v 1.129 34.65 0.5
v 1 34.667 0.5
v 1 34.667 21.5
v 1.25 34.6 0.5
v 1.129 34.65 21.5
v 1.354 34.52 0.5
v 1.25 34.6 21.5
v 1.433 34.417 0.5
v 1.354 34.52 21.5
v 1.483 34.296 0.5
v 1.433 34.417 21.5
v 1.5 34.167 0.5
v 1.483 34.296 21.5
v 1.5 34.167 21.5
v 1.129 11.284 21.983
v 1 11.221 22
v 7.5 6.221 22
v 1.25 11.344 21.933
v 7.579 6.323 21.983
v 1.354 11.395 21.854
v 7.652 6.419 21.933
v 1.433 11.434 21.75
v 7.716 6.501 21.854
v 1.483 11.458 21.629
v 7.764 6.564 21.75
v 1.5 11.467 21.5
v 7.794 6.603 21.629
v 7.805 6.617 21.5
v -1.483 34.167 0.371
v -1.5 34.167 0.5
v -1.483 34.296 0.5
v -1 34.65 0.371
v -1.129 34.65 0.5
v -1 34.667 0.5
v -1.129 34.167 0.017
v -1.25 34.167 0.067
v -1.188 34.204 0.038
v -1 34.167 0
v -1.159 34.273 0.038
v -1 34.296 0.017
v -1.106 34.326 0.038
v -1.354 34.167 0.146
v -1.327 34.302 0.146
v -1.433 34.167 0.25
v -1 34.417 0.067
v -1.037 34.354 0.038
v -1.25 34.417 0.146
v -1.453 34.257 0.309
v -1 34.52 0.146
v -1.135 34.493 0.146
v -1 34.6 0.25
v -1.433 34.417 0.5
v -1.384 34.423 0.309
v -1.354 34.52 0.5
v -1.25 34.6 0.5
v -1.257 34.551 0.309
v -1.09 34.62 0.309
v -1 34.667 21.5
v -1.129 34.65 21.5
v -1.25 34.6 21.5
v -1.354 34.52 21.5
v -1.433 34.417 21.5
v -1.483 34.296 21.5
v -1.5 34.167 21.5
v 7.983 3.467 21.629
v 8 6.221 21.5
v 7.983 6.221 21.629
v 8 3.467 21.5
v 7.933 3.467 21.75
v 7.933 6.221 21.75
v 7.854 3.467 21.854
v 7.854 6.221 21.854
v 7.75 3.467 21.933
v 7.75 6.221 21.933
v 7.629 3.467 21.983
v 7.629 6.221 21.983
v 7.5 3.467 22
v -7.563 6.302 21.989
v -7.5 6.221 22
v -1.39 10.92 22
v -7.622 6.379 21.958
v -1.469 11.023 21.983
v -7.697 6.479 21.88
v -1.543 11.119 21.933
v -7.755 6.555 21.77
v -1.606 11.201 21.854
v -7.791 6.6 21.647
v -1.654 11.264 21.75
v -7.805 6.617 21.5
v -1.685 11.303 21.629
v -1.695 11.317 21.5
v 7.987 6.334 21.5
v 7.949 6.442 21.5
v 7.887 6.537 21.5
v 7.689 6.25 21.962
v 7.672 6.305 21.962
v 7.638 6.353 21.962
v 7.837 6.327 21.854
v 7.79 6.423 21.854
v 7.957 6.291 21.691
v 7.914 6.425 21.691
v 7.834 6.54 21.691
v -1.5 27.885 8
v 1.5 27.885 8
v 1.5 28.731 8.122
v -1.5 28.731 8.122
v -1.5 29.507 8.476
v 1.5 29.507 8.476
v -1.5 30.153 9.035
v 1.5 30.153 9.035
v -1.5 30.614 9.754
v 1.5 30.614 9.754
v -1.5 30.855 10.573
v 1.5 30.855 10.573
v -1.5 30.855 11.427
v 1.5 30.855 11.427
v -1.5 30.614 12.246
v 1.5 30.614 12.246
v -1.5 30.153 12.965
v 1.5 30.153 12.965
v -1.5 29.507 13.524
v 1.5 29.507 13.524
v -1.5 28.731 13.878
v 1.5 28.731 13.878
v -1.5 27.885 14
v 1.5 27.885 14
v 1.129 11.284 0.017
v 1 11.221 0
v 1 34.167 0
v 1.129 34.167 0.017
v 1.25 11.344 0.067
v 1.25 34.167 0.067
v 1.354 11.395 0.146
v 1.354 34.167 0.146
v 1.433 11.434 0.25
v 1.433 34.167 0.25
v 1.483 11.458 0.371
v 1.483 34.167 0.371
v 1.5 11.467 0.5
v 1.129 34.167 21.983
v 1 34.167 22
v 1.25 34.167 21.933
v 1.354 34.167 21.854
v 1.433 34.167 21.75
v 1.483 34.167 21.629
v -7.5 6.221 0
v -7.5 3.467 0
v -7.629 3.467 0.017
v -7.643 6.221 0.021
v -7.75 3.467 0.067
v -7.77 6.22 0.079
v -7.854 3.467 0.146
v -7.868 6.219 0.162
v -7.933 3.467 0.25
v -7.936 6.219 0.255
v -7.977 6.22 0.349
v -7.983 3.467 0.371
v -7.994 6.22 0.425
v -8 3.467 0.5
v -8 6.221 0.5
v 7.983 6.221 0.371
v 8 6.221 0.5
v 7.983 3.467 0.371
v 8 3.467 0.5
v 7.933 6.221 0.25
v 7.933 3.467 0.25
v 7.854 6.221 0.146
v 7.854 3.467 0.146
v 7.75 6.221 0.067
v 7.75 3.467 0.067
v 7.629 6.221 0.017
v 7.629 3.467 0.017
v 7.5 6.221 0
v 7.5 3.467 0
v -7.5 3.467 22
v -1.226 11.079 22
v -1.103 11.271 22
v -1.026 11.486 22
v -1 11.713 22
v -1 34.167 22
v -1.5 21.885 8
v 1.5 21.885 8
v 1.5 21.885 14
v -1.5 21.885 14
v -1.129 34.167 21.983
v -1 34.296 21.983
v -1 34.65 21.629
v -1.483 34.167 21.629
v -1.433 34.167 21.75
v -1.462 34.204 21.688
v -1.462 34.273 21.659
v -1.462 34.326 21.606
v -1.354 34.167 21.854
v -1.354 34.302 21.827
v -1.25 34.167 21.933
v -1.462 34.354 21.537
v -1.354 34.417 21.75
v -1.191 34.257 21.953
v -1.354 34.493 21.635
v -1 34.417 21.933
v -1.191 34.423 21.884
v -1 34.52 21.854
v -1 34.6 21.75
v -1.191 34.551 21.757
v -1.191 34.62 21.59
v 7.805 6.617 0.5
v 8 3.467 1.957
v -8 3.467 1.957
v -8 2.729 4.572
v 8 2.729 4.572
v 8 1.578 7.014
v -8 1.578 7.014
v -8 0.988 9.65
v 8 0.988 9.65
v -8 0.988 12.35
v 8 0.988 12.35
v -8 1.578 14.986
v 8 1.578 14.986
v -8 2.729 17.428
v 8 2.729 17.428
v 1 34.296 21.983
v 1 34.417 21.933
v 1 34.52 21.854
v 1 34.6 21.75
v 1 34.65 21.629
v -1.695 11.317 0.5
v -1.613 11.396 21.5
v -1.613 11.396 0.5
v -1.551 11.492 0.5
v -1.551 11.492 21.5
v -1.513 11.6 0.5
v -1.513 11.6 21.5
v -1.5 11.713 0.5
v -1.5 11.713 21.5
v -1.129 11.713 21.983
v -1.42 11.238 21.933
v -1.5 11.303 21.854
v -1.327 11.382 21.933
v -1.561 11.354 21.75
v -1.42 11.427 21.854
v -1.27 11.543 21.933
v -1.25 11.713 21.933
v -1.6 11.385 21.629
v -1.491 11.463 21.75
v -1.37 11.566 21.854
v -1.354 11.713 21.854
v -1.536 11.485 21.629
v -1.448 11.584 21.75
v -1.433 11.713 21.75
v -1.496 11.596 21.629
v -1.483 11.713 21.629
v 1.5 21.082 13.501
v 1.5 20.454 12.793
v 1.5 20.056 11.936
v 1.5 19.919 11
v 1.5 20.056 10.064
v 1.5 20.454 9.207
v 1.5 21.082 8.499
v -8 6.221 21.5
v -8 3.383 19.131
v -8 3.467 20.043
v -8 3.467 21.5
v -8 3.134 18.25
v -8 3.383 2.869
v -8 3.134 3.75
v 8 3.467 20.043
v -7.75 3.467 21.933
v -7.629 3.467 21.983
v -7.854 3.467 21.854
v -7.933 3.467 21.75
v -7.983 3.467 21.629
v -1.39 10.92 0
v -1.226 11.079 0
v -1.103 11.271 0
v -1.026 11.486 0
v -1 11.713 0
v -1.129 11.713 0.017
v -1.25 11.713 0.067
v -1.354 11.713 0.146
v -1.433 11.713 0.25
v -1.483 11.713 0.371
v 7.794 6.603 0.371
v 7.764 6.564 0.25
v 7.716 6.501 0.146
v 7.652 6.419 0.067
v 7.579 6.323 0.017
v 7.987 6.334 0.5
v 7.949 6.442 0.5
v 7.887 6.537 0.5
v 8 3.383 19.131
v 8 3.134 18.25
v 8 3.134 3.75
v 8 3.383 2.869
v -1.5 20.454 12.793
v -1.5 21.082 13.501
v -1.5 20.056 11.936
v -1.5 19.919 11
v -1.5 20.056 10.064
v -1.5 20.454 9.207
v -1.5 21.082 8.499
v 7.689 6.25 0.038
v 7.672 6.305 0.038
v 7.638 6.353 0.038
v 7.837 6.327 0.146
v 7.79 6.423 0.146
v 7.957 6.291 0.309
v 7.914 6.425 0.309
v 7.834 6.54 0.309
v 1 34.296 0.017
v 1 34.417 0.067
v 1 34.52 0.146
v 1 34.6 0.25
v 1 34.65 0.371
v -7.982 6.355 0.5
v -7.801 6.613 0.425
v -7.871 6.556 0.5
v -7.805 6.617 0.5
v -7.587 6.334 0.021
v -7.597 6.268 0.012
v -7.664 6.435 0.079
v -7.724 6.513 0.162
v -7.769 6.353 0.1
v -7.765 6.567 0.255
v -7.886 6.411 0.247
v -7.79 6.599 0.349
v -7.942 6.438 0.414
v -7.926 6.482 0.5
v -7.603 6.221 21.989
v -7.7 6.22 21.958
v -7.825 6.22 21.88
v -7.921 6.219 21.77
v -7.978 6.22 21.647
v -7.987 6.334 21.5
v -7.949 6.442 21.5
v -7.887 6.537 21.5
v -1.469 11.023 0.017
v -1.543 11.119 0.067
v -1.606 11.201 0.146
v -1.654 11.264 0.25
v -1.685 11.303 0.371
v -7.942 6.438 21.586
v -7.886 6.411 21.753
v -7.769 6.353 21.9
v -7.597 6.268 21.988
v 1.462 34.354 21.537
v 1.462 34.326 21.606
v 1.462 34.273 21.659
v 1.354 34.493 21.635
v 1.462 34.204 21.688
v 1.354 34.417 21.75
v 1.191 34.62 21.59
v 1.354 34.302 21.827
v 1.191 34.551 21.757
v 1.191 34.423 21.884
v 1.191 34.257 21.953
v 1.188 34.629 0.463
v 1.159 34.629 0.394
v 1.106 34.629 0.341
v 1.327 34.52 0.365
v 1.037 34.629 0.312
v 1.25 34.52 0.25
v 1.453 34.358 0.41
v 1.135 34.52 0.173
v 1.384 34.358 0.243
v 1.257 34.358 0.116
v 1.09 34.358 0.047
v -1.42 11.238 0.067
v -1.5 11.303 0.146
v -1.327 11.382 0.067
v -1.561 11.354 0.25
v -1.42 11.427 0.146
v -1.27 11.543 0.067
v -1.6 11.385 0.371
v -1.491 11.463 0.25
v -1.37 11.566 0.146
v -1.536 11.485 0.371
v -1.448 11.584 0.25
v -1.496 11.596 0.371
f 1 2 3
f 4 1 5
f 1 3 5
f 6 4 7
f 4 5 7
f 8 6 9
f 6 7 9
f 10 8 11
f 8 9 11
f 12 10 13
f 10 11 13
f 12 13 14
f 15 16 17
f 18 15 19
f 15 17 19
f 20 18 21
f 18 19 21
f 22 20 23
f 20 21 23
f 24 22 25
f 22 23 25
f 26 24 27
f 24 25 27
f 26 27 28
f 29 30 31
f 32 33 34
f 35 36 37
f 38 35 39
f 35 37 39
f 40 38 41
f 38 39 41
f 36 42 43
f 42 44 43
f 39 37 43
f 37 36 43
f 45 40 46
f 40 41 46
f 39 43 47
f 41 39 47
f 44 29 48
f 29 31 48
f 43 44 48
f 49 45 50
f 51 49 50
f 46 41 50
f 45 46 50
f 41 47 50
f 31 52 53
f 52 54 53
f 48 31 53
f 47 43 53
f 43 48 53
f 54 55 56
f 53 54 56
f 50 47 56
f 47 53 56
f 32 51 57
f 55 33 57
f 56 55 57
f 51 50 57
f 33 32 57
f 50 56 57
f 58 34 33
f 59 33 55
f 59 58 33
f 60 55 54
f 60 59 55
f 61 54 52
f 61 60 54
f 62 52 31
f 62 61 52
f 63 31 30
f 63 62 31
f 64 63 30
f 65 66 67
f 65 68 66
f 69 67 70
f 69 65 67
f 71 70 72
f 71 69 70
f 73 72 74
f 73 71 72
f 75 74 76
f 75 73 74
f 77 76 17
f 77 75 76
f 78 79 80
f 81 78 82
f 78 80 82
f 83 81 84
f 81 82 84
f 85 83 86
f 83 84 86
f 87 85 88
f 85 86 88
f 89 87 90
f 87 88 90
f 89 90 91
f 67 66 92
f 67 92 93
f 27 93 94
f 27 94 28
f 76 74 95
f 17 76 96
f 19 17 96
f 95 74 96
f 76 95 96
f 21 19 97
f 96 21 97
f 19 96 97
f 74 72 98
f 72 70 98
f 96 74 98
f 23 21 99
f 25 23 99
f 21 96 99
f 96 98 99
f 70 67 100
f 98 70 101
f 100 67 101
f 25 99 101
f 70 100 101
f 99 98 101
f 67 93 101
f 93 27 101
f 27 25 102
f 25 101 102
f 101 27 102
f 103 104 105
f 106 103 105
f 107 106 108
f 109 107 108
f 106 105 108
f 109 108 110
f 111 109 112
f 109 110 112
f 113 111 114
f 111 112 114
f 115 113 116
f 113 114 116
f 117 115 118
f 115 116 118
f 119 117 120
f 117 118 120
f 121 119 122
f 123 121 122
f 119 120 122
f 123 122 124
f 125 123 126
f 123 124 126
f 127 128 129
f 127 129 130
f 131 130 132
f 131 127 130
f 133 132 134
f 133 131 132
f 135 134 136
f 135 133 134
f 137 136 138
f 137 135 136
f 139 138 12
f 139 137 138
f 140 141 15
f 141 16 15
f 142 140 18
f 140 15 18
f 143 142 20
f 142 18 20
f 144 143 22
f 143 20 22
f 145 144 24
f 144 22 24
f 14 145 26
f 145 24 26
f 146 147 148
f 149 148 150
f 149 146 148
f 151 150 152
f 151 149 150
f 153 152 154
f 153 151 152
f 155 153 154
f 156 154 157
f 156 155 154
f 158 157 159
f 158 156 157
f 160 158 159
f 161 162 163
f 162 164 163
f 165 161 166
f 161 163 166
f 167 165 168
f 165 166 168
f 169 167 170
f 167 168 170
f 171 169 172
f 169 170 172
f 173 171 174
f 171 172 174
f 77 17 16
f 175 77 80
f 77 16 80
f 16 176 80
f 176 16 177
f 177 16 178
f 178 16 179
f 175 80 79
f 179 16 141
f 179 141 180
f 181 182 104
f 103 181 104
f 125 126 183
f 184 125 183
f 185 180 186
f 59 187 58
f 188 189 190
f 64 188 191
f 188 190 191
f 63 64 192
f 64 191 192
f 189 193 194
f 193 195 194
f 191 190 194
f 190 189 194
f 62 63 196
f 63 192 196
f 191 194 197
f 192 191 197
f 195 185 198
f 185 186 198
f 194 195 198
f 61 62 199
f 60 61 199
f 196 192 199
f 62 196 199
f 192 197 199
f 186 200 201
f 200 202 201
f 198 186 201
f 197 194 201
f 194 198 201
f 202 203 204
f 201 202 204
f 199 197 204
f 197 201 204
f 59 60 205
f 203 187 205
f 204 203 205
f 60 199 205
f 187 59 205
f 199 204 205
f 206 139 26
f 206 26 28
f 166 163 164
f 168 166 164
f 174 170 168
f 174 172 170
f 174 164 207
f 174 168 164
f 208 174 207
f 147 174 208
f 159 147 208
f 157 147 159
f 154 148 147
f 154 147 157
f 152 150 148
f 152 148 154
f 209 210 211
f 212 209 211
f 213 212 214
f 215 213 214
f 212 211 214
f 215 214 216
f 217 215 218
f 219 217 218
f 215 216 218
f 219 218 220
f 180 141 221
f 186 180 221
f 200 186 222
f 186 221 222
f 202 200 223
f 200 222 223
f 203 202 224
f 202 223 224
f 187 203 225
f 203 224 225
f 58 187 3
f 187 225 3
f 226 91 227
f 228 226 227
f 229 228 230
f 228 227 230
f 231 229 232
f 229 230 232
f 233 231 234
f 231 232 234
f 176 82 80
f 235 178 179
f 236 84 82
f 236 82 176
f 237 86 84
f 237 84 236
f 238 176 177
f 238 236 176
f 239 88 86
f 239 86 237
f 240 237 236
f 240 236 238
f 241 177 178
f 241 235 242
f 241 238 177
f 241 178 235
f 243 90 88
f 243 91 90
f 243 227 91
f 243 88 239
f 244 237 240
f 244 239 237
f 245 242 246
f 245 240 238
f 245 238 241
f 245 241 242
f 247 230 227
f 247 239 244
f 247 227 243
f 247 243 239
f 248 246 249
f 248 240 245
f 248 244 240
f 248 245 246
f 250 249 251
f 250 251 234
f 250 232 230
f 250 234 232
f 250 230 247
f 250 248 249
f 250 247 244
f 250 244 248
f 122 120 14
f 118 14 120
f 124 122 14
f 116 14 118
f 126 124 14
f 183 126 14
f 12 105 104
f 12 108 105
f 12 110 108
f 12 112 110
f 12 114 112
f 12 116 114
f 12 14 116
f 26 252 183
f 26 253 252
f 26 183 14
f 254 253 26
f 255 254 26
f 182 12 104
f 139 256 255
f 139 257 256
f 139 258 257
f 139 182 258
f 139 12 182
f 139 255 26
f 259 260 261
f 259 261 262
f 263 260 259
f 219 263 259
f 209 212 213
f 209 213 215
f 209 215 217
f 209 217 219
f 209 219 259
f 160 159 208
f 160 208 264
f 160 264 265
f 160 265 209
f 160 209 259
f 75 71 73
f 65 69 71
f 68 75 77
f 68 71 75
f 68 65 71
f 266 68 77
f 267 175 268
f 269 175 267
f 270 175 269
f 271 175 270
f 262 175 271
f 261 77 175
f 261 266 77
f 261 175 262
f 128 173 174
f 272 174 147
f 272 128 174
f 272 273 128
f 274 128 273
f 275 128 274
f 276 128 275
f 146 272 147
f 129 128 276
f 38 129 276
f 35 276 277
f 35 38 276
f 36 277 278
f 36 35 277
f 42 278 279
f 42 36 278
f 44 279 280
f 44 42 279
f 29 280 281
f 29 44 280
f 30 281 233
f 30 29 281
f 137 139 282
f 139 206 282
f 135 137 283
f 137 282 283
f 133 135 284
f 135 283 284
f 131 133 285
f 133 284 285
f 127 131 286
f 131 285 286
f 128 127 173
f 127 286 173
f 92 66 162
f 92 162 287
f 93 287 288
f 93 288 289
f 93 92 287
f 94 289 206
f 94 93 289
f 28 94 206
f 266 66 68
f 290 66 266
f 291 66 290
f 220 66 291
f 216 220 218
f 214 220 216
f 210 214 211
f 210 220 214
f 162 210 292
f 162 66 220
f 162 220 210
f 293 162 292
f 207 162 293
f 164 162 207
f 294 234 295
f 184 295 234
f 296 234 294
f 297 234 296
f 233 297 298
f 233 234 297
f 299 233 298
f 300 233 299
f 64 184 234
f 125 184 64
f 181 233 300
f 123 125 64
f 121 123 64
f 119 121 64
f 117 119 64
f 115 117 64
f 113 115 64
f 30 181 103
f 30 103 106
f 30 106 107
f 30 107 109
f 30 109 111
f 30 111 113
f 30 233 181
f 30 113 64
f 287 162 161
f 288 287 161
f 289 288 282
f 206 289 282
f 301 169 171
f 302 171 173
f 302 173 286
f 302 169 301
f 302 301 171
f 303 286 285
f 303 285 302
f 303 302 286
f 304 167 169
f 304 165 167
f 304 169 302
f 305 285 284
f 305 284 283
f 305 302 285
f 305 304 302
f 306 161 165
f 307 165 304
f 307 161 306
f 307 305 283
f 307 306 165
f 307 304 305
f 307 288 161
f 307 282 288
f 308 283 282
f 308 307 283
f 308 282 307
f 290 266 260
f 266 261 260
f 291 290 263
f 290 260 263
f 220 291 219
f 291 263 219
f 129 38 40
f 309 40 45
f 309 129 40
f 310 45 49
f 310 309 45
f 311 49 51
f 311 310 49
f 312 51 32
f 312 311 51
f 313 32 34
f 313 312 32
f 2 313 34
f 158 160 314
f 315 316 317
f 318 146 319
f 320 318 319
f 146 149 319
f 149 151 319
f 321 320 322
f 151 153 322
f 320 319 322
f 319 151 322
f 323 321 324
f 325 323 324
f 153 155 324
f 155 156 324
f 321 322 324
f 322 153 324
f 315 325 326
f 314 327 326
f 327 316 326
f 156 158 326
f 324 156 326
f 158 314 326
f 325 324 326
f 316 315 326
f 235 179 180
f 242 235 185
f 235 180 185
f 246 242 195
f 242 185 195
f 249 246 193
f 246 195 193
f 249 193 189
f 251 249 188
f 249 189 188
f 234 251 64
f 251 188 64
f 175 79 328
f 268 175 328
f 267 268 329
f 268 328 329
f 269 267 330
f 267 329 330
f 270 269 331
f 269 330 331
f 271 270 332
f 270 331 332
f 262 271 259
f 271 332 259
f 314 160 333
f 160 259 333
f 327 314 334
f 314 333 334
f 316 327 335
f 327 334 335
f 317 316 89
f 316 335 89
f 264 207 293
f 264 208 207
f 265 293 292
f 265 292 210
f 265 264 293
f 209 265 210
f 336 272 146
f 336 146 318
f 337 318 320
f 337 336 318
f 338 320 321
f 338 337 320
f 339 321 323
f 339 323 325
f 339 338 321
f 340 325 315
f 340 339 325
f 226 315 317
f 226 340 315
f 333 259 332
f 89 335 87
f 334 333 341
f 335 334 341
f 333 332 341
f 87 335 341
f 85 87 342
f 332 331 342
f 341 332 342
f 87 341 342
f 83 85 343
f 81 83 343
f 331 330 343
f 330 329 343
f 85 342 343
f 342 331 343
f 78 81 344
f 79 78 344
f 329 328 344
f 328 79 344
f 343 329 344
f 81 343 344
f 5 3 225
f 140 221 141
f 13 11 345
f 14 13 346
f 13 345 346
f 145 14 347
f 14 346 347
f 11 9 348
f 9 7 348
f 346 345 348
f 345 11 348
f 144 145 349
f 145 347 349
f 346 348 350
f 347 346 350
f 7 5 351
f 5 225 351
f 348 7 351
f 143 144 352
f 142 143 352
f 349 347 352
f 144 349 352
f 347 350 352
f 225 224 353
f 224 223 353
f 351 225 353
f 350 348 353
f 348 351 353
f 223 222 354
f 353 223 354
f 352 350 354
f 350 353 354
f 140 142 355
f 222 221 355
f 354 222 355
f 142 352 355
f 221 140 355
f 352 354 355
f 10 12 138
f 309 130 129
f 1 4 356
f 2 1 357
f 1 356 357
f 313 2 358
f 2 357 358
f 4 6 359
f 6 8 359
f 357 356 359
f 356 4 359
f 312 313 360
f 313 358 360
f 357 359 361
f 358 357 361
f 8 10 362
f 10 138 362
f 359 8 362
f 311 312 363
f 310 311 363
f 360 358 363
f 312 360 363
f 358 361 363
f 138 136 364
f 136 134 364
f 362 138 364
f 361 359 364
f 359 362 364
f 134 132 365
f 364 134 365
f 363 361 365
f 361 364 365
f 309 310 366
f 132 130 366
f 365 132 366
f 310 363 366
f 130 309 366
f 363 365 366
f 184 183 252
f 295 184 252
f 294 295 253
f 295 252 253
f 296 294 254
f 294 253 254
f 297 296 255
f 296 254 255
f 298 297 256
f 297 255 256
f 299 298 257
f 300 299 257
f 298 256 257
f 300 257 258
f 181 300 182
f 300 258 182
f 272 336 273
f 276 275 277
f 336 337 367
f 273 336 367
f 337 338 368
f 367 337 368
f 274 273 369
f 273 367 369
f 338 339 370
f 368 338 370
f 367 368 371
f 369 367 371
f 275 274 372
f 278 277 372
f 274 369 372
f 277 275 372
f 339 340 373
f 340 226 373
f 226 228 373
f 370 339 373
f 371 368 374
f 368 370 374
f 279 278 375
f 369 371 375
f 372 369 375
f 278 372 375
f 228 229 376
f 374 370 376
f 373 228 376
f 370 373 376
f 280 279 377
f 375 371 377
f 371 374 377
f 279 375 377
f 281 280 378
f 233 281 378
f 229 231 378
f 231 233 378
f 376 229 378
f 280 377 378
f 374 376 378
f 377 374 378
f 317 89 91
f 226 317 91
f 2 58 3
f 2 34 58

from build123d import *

# Parameters (mm, degrees)
RESSALTO_EXTRUS_O1_DEPTH = 22
RESSALTO_EXTRUS_O2_DEPTH = 16
FILETE1_R                = 5
FILETE2_R                = 0.5
FILETE3_R                = 0.5
CORTE_EXTRUS_O1_DEPTH    = 43.143081298


with BuildPart() as part:
    # Esboço2 → Ressalto-extrusão1 (new body)
    with BuildSketch(Plane.XY):
        Polygon((-1.5, 34.66683278), (1.5, 34.66683278), (1.5, 11.46683278), (8, 6.46683278), (8, 3.46683278), (-8, 3.46683278), (-8, 6.46683278), (-1.5, 11.46683278), align=None)
    extrude(amount=RESSALTO_EXTRUS_O1_DEPTH)

    # Esboço3 → Ressalto-extrusão2 (add)
    with BuildSketch(Plane(origin=(8, 0, 0), x_dir=(0, 0, -1), z_dir=(1, 0, 0))):
        with BuildLine():
            Line((-18.5, 3.46683278), (-3.5, 3.46683278))
            ThreePointArc((-3.5, 3.46683278), (-11, 0.913484582), (-18.5, 3.46683278))
        make_face()
    extrude(amount=-RESSALTO_EXTRUS_O2_DEPTH)

    # Filete1
    filete1_edges = [part.edges().sort_by_distance(p)[0] for p in [
        (0, 3.46683278, 3.5),
        (0, 3.46683278, 18.5),
    ]]
    fillet(filete1_edges, radius=FILETE1_R)

    # Filete2
    filete2_edges = [part.edges().sort_by_distance(p)[0] for p in [
        (0, 34.66683278, 22),
        (1.5, 23.06683278, 0),
        (4.75, 8.96683278, 0),
        (-1.5, 23.06683278, 22),
        (8, 6.46683278, 11),
        (-1.5, 11.46683278, 11),
        (-1.5, 34.66683278, 11),
        (1.5, 34.66683278, 11),
        (-4.75, 8.96683278, 22),
        (-8, 4.96683278, 22),
        (8, 4.96683278, 22),
        (4.75, 8.96683278, 22),
        (1.5, 23.06683278, 22),
        (8, 4.96683278, 0),
        (-8, 4.96683278, 0),
        (-4.75, 8.96683278, 0),
        (-1.5, 23.06683278, 0),
        (0, 34.66683278, 0),
    ]]
    fillet(filete2_edges, radius=FILETE2_R)

    # Filete3
    filete3_edges = [part.edges().sort_by_distance(p)[0] for p in [
        (-8, 6.46683278, 11),
        (-7.843873382, 6.389955799, 21.86297534),
        (-7.843873382, 6.389955799, 0.13702466),
    ]]
    fillet(filete3_edges, radius=FILETE3_R)

    # Esboço4 → Corte-extrusão1 (cut, through all)
    with BuildSketch(Plane(origin=(1.5, 0, 0), x_dir=(0, 0, -1), z_dir=(1, 0, 0))):
        with BuildLine():
            Line((-14, 27.885318181), (-14, 21.885318181))
            ThreePointArc((-14, 21.885318181), (-11, 19.91907546), (-8, 21.885318181))
            Line((-8, 21.885318181), (-8, 27.885318181))
            ThreePointArc((-8, 27.885318181), (-11, 30.885318181), (-14, 27.885318181))
        make_face()
    extrude(amount=-CORTE_EXTRUS_O1_DEPTH, mode=Mode.SUBTRACT)


solid = part.part
